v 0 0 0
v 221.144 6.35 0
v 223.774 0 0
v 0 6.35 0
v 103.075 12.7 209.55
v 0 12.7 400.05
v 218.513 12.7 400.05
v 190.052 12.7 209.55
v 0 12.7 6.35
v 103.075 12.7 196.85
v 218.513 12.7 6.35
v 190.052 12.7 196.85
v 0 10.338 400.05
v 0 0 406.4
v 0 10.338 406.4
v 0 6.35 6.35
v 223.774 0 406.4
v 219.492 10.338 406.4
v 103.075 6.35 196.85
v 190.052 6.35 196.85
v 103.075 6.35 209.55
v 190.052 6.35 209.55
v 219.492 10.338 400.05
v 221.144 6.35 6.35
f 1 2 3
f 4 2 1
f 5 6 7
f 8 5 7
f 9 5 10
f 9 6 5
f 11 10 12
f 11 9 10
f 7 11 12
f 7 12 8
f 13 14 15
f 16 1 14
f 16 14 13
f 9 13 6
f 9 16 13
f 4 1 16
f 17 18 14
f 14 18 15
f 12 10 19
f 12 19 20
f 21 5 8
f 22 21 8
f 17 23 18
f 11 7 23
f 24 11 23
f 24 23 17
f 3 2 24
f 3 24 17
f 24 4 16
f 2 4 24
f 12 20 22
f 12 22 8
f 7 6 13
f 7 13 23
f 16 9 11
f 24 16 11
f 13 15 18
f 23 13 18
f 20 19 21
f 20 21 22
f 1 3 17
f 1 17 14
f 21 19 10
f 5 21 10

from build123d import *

# Parameters (mm, degrees)
BOSS_EXTRUDE1_DEPTH = 406.4
SKETCH2_W           = 223.774
SKETCH2_H           = 6.35
CUT_EXTRUDE1_DEPTH  = 2.3622
CAVITY1_START       = 196.85
CAVITY1_OUTLINE_W   = 86.97620095
CAVITY1_OUTLINE_H   = 6.35
CAVITY1_DEPTH       = 12.7
SKETCH3_W           = 266.782886341
SKETCH3_H           = 6.35
CUT_EXTRUDE2_DEPTH  = 6.35


# Read off the part's stored shape, not the designer's step: Cavity1
with BuildPart() as part:
    # Sketch1 → Boss-Extrude1 (new body)
    with BuildSketch(Plane.XY):
        Polygon((0, 0), (0, 12.7), (218.513487758, 12.7), (223.774, 0), align=None)
    extrude(amount=BOSS_EXTRUDE1_DEPTH)

    # Sketch2 → Cut-Extrude1 (cut)
    with BuildSketch(Plane.XZ.offset(-12.7)):
        with Locations((111.887, 403.225)):
            Rectangle(SKETCH2_W, SKETCH2_H)
    extrude(amount=CUT_EXTRUDE1_DEPTH, mode=Mode.SUBTRACT)

    # Cavity1 outline → Cavity1 (cut)
    with BuildSketch(Plane.XY.offset(CAVITY1_START)):
        with Locations((146.563552259, 9.525)):
            Rectangle(CAVITY1_OUTLINE_W, CAVITY1_OUTLINE_H)
    extrude(amount=CAVITY1_DEPTH, mode=Mode.SUBTRACT)

    # Sketch3 → Cut-Extrude2 (cut)
    with BuildSketch(Plane(origin=(0, 12.7, 0), x_dir=(1, 0, 0), z_dir=(0, 1, 0))):
        with Locations((133.39144317, -3.175)):
            Rectangle(SKETCH3_W, SKETCH3_H)
    extrude(amount=-CUT_EXTRUDE2_DEPTH, mode=Mode.SUBTRACT)


solid = part.part
